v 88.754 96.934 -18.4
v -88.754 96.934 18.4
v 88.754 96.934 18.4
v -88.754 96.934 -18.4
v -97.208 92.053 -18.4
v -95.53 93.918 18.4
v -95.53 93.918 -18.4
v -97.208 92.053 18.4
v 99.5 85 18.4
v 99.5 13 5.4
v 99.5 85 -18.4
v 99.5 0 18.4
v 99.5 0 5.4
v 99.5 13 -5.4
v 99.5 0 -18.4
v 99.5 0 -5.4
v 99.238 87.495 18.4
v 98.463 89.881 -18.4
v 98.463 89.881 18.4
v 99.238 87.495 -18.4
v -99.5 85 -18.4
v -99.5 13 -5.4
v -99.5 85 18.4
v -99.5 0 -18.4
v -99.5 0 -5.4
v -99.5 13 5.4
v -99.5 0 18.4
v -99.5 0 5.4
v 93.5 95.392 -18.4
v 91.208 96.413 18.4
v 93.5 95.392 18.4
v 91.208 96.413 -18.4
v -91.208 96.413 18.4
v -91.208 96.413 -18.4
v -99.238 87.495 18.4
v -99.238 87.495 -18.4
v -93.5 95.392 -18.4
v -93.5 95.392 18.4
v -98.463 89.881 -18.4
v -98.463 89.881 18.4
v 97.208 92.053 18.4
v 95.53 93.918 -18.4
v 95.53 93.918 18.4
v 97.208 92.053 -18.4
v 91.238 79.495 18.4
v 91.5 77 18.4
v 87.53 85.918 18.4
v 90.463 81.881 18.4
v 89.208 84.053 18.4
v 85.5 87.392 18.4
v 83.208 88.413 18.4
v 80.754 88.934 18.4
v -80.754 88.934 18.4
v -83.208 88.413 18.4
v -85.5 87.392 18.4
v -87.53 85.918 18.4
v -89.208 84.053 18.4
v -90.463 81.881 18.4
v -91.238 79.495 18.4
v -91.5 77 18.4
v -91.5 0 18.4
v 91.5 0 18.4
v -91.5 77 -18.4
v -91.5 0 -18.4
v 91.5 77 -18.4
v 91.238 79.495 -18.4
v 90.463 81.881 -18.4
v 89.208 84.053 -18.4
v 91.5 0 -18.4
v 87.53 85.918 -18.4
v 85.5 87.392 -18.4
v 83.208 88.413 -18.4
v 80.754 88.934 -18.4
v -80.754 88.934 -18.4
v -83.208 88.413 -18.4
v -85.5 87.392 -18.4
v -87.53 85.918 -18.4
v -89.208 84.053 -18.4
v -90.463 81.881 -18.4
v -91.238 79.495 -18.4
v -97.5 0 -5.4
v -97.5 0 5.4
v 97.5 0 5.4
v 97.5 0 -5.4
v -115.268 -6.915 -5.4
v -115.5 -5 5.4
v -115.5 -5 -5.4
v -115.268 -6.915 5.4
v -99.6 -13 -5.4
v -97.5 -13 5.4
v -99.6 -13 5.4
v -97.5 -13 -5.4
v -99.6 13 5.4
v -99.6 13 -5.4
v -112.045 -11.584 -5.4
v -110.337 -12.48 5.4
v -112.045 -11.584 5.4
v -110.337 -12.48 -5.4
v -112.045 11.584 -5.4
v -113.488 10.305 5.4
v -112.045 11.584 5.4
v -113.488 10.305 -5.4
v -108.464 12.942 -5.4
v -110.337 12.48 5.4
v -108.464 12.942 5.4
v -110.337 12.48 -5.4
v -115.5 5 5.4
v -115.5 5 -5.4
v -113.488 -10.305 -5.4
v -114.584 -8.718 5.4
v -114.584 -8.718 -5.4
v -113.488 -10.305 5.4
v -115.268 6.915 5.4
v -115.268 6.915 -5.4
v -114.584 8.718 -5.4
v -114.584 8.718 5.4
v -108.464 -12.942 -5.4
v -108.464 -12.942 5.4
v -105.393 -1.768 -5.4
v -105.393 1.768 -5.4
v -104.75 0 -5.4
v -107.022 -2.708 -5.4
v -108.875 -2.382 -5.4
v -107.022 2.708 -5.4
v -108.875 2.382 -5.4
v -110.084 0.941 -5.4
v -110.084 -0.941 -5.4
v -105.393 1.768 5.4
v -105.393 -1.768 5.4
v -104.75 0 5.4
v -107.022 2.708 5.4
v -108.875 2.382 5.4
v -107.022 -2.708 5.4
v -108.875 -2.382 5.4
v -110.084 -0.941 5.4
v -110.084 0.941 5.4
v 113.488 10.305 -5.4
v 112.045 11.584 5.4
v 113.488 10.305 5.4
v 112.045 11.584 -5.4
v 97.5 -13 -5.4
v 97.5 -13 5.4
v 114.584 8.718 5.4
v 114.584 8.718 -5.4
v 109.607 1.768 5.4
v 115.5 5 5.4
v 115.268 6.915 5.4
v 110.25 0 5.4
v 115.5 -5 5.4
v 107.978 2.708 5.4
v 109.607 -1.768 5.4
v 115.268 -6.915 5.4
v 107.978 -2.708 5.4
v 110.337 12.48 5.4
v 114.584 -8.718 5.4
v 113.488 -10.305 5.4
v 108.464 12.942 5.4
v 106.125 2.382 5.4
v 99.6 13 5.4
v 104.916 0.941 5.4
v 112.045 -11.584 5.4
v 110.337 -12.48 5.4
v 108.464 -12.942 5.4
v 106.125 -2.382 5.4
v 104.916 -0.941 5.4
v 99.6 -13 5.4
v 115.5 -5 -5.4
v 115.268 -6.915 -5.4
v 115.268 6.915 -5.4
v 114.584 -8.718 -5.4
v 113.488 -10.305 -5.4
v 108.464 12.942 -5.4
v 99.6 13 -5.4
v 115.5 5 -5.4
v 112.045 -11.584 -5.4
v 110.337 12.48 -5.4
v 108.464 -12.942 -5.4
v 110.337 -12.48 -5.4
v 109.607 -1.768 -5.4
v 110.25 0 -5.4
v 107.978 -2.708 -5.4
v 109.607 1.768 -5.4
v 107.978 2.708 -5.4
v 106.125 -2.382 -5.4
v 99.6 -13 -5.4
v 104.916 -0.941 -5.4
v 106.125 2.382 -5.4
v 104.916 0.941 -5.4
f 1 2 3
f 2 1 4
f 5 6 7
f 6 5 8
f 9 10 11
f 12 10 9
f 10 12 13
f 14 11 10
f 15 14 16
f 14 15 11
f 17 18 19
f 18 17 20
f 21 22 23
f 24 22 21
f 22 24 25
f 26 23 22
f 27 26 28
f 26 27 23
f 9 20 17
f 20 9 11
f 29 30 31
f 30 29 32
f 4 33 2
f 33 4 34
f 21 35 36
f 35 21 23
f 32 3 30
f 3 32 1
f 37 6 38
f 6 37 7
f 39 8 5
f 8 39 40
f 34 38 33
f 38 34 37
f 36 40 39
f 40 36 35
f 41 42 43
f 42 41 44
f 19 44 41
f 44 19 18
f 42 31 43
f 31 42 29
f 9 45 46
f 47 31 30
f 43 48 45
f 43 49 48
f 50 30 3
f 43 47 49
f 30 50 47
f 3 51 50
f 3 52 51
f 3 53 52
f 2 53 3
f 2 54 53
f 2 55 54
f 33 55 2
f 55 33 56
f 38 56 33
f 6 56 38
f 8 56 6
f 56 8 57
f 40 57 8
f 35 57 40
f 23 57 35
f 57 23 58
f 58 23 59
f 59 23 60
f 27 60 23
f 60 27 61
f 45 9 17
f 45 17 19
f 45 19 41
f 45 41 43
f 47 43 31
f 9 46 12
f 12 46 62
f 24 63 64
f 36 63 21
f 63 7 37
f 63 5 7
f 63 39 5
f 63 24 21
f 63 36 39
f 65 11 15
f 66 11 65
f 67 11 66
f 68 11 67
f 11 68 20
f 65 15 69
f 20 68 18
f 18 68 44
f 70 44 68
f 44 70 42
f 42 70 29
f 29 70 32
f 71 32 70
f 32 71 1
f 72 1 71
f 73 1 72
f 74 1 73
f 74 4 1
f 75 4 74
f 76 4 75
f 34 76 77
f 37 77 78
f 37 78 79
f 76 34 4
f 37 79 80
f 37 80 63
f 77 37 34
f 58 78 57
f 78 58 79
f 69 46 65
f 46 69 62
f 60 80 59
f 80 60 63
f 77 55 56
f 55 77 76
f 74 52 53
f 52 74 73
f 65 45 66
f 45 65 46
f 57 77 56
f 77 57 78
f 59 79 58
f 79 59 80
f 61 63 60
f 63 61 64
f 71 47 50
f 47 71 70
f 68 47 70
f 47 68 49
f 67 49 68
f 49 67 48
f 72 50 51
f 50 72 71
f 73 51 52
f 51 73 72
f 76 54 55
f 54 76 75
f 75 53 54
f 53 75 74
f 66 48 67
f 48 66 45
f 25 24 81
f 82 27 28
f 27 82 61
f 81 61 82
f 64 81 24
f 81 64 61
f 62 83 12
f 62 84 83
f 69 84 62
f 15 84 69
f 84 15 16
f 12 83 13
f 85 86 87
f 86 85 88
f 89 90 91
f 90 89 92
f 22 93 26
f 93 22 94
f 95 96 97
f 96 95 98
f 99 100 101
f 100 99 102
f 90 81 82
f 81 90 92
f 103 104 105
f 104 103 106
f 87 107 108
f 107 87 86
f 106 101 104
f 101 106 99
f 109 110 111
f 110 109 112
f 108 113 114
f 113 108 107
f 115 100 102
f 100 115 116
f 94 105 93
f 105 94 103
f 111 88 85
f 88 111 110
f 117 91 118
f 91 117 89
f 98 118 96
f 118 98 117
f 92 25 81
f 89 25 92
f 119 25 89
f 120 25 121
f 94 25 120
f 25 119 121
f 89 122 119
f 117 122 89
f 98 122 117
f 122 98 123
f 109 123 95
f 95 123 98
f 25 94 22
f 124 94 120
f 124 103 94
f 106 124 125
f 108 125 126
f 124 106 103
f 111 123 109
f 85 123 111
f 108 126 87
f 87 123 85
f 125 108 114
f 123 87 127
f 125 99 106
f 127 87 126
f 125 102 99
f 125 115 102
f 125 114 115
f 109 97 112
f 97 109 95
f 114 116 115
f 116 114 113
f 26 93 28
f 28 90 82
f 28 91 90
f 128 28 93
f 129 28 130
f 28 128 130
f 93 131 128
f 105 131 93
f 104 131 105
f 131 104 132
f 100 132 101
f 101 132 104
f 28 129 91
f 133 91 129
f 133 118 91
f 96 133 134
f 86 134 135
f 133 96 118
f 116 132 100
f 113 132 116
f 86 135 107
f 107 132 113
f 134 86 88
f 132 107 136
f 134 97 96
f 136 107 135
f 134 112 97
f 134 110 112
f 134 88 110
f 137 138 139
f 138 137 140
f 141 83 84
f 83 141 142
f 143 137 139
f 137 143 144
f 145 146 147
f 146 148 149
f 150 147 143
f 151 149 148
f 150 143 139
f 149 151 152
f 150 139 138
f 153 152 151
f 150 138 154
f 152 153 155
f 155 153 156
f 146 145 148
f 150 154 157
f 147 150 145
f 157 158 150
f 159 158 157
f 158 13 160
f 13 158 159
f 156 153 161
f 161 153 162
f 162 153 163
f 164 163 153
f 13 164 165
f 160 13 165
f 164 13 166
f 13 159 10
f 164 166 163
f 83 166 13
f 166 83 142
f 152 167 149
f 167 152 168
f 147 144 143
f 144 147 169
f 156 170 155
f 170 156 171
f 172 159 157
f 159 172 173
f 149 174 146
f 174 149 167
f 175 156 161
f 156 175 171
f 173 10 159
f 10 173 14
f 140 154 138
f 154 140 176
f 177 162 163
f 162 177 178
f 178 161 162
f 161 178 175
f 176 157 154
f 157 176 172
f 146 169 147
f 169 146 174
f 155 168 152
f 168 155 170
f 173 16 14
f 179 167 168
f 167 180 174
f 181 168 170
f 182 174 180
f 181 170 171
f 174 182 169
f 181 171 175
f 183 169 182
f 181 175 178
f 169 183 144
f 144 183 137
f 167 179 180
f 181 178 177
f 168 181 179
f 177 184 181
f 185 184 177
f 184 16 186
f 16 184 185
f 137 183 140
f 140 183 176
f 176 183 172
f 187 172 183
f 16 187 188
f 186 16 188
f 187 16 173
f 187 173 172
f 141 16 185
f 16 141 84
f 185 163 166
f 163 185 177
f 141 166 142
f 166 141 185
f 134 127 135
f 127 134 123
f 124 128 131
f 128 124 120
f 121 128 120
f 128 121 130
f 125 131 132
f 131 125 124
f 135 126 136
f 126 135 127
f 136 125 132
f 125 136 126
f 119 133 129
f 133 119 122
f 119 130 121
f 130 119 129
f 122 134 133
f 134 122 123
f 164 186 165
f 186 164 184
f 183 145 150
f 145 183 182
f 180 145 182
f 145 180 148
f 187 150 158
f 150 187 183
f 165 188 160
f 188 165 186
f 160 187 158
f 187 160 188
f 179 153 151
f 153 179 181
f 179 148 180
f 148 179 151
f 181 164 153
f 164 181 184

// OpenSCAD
// file: collar.scad
module raw_collar_profile(w, d, r, wall) {
    difference() {
        union() {
            // 1. Pristine rounded hopper profile ring core
            difference() {
                minkowski() {
                    cube([w + wall*2 - r*2, d + wall*2 - r*2, collar_height], center=true);
                    cylinder(r=r, h=0.001, center=true);
                }
                minkowski() {
                    cube([w - r*2, d - r*2, collar_height + 5], center=true);
                    cylinder(r=r, h=0.001, center=true);
                }
            }
            // 2. Integrated flat mounting wall flange (Kept sharp and flat)
            translate([0, back_y_outer + wall/2, 0])
                cube([backplate_w, wall, collar_height], center=true);
        }
        // Clean out any inner wall bleed from the flat flange block
        minkowski() {
            cube([w - r*2, d - r*2, collar_height + 5], center=true);
            cylinder(r=r, h=0.001, center=true);
        }
    }
}
// file: ear_knuckle.scad
include <params.scad>

module raw_collar_profile(w, d, r, wall) {
    difference() {
        union() {
            // 1. Pristine rounded hopper profile ring core
            difference() {
                minkowski() {
                    cube([w + wall*2 - r*2, d + wall*2 - r*2, collar_height], center=true);
                    cylinder(r=r, h=0.001, center=true);
                }
                minkowski() {
                    cube([w - r*2, d - r*2, collar_height + 5], center=true);
                    cylinder(r=r, h=0.001, center=true);
                }
            }
            // 2. Integrated flat mounting wall flange (Kept sharp and flat)
            translate([0, back_y_outer + wall/2, 0])
                cube([backplate_w, wall, collar_height], center=true);
        }
        // Clean out any inner wall bleed from the flat flange block
        minkowski() {
            cube([w - r*2, d - r*2, collar_height + 5], center=true);
            cylinder(r=r, h=0.001, center=true);
        }
    }
}

// Symmetrical layout math prevents all distortion, fins, and steps
module ear_knuckle_profile(w, d, h, r, x_sign, clear_inner = 0) {
    overlap = 2.0; 
    mirror([x_sign == -1 ? 1 : 0, 0, 0]) {
        linear_extrude(height = h, center = true) {
            difference() {
                // Combine the rounded ear profile with a rock-solid wall anchor pad
                union() {
                    hull() {
                        translate([-w/2, -d/2]) square([0.1, d]);
                        translate([w/2 - r, -d/2 + r]) circle(r);
                        translate([w/2 - r,  d/2 - r]) circle(r); 
                    }
                    translate([-w/2 - overlap, -d/2]) square([overlap + 0.1, d]);
                }
                // Crisp 90-degree rectangle cutout for the slider clearance face (Y >= 0)
                if (clear_inner > 0) {
                    translate([-w/2 - overlap - 0.1, -0.01]) 
                        square([overlap + clear_inner + 0.1, d/2 + 0.1]);
                }
            }
        }
    }
}
// file: params.scad
// --- PRECISE ONEISALL 5L RECTANGULAR HOPPER DIMENSIONS ---
tank_width         = 180;
tank_depth         = 175;
tank_corner_radius = 12;
clamp_height       = 36;
wall_thickness     = 8;
clearance          = 1.5;
screw_hole_dia     = 5.0;

// --- VERTICAL DROP PIN SETTINGS ---
pin_hole_dia  = 5.5;
pin_clearance = 0.4;

// --- HINGE KNUCKLE CLEARANCE ---
knuckle_relief = 0.8;

// --- ASSEMBLY CLEARANCE ---
split_chamfer   = 3.0;
hinge_clearance = 0.4; // The exact horizontal gap needed for a clean sliding fit

// --- HINGE SMOOTHING ---
ear_corner_radius = 8;

/* [Hidden] */
w_inner         = tank_width  + clearance * 2;
d_inner         = tank_depth  + clearance * 2;
ear_width       = 16;
ear_depth       = 26;
knuckle_layer_h = clamp_height / 3;
middle_ear_h    = knuckle_layer_h - pin_clearance - knuckle_relief;
bisect_half     = d_inner / 2 + wall_thickness * 2 + 30;
ear_x           = w_inner / 2 + wall_thickness + ear_width / 2;
ear_z_ctr       = knuckle_layer_h + knuckle_relief / 2;

// Dynamic collar height matching the knuckle vertical thresholds perfectly
collar_height   = ear_z_ctr * 2 + knuckle_layer_h; 

// Compact wing width spans exactly to the outer edge of the hinge knuckles
backplate_w     = (ear_x + ear_width/2) * 2;
back_y_outer    = -(d_inner / 2 + wall_thickness);
// main file
include <params.scad>
include <ear_knuckle.scad>
include <collar.scad>

front_clamp();

module front_clamp() {
    difference() {
        union() {
            difference() {
                raw_collar_profile(w_inner, d_inner, tank_corner_radius, wall_thickness);
                translate([0, -bisect_half, 0])
                    cube([w_inner*3, bisect_half*2, collar_height + 40], center=true);
            }
            for (x_sign = [-1, 1])
                translate([x_sign * ear_x, 0, 0])
                    ear_knuckle_profile(ear_width, ear_depth, middle_ear_h, ear_corner_radius, x_sign, 0);
        }
        for (x_sign = [-1, 1])
            translate([x_sign * ear_x, 0, 0])
                cylinder(h=collar_height + 10, d=pin_hole_dia, center=true);
    }
}
